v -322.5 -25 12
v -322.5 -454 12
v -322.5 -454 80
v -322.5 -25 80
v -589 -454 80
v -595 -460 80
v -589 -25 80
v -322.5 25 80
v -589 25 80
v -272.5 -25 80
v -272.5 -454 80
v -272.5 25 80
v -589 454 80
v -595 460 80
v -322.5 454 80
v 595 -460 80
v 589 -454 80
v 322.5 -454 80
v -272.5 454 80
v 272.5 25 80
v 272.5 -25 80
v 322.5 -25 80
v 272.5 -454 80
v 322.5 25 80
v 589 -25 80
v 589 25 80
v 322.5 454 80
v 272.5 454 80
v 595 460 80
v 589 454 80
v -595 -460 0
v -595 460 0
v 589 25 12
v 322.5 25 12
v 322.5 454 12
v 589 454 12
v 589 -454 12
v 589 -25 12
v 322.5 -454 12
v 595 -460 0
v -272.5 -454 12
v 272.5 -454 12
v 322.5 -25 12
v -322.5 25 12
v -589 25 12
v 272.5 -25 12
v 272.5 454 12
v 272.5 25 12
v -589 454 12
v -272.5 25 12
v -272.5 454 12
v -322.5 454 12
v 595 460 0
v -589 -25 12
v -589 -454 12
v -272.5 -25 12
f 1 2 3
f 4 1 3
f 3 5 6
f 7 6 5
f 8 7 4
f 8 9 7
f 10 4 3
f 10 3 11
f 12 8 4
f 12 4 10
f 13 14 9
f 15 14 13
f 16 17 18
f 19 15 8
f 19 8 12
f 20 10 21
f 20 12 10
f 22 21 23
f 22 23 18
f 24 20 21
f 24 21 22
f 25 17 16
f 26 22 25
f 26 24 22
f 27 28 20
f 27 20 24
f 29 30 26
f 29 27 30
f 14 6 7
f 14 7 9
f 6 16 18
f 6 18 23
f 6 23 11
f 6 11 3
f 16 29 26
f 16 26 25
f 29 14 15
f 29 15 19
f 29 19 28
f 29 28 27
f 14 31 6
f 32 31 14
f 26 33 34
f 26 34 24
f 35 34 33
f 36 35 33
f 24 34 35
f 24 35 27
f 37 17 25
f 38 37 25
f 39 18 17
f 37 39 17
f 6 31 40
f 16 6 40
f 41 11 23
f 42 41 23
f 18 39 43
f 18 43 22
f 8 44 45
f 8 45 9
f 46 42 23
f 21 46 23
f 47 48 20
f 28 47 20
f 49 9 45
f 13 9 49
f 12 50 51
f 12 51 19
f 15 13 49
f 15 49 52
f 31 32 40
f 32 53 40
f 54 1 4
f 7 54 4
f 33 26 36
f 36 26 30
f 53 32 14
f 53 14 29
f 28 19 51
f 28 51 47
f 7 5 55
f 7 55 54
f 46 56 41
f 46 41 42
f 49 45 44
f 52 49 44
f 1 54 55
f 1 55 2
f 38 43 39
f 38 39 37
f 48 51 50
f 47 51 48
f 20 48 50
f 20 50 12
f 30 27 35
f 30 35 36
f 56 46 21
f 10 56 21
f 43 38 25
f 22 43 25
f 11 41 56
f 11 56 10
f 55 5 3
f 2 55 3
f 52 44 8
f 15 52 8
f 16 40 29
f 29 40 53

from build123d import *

# Parameters (mm, degrees)
F0_W     = 1190
F0_H     = 920
F1_DEPTH = 80
F2_W     = 1178
F2_H     = 908
F3_DEPTH = 68
F4_W     = 50
F4_H     = 80
F5_DEPTH = 908
F6_W     = 50
F6_H     = 80
F7_DEPTH = 1178


with BuildPart() as f1:
    # F0 (on Top) → F1 (new body)
    with BuildSketch(Plane.XY):
        Rectangle(F0_W, F0_H)
    extrude(amount=F1_DEPTH)

    # F2 (on face) → F3 (cut)
    with BuildSketch(Plane.XY.offset(80)):
        Rectangle(F2_W, F2_H)
    extrude(amount=-F3_DEPTH, mode=Mode.SUBTRACT)

    # F4 (on face) → F5 (join)
    with BuildSketch(Plane(origin=(0, -454, 0), x_dir=(-1, 0, 0), z_dir=(0, 1, 0))):
        with Locations((-297.5, 40)):
            Rectangle(F4_W, F4_H)
        with Locations((297.5, 40)):
            Rectangle(F4_W, F4_H)
    extrude(amount=F5_DEPTH)

    # F6 (on face) → F7 (join)
    with BuildSketch(Plane(origin=(589, 0, 0), x_dir=(0, -1, 0), z_dir=(-1, 0, 0))):
        with Locations((0, 40)):
            Rectangle(F6_W, F6_H)
    extrude(amount=F7_DEPTH)


solid = f1.part
